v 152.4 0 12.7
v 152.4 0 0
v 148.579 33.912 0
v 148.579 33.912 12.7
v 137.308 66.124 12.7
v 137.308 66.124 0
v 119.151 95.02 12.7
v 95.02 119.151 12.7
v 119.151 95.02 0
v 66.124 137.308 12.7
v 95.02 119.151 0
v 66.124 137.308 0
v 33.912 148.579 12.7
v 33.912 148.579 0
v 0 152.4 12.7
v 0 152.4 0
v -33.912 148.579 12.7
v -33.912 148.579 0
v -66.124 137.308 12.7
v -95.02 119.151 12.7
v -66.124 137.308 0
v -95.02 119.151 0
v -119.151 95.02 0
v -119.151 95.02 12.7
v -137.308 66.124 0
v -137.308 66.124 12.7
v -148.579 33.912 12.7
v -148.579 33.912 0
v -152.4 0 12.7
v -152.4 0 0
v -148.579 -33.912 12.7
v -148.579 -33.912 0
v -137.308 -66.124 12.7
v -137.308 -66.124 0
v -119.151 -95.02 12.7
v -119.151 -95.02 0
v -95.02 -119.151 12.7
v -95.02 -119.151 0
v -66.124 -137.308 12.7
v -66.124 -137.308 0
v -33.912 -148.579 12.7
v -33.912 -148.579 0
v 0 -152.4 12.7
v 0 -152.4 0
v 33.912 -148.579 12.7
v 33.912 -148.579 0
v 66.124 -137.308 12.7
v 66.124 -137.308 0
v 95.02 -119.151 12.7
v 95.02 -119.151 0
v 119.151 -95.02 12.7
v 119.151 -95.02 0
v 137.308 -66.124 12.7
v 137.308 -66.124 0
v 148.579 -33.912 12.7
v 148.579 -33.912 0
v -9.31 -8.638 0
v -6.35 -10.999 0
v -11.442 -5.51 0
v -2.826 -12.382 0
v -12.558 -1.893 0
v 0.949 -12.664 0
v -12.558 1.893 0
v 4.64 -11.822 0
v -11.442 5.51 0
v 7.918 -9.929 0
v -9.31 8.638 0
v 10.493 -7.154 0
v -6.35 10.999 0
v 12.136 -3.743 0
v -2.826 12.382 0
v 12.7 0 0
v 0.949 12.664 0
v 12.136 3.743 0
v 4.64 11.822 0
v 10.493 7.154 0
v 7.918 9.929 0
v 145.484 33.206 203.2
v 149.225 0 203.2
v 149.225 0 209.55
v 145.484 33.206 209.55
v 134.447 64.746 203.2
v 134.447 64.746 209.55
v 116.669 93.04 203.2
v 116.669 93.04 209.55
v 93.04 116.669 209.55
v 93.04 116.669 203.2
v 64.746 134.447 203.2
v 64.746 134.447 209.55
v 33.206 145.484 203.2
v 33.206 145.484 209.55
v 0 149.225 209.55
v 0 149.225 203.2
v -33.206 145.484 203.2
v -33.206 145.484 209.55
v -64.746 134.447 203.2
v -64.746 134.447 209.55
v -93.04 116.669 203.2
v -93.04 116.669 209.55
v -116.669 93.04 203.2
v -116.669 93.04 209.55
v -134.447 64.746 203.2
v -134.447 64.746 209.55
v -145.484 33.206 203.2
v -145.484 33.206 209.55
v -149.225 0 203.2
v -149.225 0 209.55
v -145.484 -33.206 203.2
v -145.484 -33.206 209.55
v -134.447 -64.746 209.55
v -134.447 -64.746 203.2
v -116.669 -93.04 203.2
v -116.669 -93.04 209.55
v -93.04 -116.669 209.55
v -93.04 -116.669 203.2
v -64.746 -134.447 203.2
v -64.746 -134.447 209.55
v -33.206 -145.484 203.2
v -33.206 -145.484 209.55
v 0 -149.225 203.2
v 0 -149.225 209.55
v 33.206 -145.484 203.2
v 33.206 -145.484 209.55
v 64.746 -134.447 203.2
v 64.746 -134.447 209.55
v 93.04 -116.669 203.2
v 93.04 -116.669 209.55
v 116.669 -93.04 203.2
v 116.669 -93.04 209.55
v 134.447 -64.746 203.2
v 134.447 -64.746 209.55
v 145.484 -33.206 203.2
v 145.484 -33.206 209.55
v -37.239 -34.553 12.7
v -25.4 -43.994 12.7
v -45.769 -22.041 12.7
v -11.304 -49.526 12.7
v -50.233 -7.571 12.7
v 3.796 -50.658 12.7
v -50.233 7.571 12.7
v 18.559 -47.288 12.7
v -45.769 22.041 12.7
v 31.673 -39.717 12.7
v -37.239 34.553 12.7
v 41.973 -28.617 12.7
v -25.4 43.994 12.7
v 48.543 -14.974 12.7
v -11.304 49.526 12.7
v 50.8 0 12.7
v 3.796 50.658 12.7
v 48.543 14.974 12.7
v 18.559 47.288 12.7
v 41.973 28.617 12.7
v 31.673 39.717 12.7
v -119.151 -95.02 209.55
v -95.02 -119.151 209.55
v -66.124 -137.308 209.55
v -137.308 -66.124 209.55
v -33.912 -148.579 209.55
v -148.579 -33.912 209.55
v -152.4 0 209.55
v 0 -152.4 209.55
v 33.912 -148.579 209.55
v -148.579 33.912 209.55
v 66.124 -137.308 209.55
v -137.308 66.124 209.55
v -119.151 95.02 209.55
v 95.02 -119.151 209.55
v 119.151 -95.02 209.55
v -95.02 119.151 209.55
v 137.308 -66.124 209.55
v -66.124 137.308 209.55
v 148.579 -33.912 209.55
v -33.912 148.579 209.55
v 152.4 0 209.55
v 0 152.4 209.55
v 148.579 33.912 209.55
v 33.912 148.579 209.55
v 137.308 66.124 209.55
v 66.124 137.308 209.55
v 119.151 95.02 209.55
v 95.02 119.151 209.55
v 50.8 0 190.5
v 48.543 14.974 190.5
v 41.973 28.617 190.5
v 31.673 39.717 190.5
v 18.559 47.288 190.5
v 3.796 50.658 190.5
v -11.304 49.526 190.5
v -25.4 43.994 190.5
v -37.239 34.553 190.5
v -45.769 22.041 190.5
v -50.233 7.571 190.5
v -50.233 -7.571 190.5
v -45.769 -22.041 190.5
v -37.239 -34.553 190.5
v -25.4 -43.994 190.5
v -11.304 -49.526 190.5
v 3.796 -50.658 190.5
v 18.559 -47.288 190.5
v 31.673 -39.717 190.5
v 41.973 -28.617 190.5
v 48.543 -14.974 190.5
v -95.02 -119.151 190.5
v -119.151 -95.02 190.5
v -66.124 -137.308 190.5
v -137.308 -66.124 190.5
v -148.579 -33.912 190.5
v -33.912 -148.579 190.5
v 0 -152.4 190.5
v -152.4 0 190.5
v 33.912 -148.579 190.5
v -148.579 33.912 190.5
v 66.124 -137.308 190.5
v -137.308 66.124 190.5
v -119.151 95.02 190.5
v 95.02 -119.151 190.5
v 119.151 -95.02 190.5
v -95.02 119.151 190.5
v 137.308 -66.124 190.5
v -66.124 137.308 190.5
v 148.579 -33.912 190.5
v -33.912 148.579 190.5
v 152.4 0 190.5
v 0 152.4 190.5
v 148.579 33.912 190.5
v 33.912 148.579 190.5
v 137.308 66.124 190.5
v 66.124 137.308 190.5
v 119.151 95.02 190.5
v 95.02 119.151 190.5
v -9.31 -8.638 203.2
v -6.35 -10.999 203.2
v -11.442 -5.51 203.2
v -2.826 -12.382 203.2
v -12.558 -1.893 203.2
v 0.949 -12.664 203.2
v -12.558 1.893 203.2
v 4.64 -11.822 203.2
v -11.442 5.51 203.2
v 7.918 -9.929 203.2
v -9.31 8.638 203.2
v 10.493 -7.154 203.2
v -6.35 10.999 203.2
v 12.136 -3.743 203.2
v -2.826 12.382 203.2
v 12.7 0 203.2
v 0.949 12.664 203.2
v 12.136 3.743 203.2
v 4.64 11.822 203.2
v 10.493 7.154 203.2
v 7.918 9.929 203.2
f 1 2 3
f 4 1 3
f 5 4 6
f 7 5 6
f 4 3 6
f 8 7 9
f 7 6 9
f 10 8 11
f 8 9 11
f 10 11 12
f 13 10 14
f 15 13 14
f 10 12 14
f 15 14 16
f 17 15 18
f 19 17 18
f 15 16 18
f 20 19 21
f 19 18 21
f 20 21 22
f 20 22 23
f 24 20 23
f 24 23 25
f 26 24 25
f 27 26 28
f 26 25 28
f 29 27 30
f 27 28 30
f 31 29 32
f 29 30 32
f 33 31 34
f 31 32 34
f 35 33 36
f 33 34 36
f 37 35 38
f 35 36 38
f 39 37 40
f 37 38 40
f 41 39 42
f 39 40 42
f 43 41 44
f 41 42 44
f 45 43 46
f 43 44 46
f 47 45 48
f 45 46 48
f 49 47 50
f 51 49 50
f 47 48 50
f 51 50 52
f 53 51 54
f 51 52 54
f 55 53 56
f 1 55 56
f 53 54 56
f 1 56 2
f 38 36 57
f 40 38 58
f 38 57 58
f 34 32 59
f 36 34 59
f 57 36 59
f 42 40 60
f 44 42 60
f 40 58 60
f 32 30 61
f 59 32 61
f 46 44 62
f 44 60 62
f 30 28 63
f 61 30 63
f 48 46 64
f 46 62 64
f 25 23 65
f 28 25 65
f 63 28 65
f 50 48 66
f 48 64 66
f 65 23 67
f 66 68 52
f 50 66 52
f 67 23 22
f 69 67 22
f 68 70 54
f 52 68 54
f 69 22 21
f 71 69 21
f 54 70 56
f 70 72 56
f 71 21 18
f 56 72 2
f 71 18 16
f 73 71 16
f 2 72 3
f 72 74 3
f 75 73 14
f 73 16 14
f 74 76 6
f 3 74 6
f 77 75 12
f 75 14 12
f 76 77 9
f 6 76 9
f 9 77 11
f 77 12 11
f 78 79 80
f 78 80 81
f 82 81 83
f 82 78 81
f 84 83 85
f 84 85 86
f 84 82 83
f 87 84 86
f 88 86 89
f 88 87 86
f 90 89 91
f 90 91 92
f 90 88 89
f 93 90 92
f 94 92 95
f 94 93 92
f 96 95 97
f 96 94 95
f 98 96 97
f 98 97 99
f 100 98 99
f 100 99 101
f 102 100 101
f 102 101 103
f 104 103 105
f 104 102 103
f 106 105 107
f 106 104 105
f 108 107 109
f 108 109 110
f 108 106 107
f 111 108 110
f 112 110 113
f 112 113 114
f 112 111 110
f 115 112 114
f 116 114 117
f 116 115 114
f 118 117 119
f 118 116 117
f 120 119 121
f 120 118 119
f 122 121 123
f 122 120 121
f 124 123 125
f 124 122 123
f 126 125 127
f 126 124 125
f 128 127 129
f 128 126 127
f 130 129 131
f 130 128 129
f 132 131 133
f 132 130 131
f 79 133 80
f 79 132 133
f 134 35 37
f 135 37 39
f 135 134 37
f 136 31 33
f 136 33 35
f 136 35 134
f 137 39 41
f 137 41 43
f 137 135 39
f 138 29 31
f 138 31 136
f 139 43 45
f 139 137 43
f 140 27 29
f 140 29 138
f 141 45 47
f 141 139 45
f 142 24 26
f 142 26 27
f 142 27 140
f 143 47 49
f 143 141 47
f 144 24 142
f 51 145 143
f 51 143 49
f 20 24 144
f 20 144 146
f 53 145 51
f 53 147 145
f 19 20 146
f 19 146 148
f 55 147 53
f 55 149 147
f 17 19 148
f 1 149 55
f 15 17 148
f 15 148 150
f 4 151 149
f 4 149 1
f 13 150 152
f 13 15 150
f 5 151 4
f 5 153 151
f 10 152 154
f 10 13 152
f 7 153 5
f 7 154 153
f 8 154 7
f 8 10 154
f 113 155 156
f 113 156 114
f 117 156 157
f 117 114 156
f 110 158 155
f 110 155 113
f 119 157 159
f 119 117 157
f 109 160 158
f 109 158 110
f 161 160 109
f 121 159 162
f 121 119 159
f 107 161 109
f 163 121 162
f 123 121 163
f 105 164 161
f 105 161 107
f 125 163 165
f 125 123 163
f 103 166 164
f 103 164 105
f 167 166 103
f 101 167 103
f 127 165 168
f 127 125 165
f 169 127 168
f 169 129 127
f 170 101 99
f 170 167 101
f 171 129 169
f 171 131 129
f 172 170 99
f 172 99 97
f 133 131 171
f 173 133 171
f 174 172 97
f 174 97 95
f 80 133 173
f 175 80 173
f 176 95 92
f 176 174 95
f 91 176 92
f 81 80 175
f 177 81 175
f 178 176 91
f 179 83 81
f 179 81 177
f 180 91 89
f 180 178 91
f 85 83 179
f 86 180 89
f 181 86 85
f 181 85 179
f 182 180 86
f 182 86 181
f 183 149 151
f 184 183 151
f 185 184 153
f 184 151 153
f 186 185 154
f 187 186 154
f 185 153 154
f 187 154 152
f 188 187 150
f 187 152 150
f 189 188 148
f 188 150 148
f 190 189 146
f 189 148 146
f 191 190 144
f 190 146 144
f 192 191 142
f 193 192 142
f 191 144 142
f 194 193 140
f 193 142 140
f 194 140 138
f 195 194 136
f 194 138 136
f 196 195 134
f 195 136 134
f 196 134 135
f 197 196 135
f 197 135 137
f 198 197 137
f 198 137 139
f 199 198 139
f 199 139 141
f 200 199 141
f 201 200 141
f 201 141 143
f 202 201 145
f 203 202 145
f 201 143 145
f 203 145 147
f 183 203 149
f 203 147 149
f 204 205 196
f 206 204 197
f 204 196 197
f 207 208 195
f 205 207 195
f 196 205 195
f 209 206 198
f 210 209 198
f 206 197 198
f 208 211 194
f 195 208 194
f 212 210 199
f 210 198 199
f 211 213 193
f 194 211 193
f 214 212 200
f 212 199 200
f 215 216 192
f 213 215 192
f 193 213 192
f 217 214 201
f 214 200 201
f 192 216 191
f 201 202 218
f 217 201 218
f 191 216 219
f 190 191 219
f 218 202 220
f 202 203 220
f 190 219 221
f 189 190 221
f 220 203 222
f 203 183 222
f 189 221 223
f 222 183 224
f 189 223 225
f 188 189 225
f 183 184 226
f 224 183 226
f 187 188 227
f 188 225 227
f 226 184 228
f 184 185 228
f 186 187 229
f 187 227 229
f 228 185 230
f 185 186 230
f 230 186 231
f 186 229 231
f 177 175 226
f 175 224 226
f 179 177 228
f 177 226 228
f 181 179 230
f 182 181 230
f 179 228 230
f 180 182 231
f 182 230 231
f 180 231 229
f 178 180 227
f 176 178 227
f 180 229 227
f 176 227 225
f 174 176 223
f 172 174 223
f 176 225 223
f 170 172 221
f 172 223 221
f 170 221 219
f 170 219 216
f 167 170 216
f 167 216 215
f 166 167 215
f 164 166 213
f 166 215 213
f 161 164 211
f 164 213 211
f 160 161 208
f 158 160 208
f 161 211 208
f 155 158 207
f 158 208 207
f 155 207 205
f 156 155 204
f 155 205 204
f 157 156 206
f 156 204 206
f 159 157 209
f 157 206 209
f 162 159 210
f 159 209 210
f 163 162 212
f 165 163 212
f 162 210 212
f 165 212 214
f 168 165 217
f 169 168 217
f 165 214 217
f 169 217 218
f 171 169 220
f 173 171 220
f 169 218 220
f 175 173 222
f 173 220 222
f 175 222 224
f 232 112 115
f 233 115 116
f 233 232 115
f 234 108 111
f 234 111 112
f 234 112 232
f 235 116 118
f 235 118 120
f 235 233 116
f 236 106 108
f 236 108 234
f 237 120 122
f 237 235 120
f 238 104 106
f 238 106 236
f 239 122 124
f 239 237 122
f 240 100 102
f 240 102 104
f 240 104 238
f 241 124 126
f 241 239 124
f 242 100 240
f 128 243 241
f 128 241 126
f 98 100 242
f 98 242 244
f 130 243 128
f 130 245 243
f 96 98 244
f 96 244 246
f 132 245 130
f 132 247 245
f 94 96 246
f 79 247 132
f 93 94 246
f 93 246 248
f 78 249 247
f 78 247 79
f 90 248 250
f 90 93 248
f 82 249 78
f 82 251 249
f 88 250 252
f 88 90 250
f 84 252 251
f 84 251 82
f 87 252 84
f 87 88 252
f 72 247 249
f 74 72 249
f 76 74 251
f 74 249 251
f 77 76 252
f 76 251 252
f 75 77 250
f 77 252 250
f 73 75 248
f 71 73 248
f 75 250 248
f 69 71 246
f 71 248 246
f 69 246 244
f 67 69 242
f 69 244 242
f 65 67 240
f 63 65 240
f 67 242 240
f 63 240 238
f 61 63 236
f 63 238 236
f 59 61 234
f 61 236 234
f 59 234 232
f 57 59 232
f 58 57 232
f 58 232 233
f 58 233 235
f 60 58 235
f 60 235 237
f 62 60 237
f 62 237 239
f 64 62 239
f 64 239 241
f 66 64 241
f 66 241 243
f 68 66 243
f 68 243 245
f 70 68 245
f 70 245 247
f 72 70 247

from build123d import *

# Parameters (mm, degrees)
F0_R     = 152.4
F1_DEPTH = 12.7
F2_R     = 50.8
F3_DEPTH = 177.8
F4_R     = 152.4
F4_R_2   = 50.8
F5_DEPTH = 12.7
F6_R     = 152.4
F6_R_2   = 149.225
F7_DEPTH = 6.35
F8_R     = 12.7
F9_DEPTH = 457.2


with BuildPart() as f1:
    # F0 (on Top) → F1 (new body)
    with BuildSketch(Plane.XY):
        Circle(F0_R)
    extrude(amount=F1_DEPTH)

    # F2 (on face) → F3 (join)
    with BuildSketch(Plane.XY.offset(12.7)):
        Circle(F2_R)
    extrude(amount=F3_DEPTH)

    # F4 (on face) → F5 (join)
    with BuildSketch(Plane.XY.offset(190.5)):
        Circle(F4_R)
        Circle(F4_R_2, mode=Mode.SUBTRACT)
        Circle(F4_R_2)
    extrude(amount=F5_DEPTH)

    # F6 (on face) → F7 (join)
    with BuildSketch(Plane.XY.offset(203.2)):
        Circle(F6_R)
        Circle(F6_R_2, mode=Mode.SUBTRACT)
    extrude(amount=F7_DEPTH)

    # F8 (on face) → F9 (cut)
    with BuildSketch(Plane.XY.offset(203.2)):
        Circle(F8_R)
    extrude(amount=-F9_DEPTH, mode=Mode.SUBTRACT)


solid = f1.part
